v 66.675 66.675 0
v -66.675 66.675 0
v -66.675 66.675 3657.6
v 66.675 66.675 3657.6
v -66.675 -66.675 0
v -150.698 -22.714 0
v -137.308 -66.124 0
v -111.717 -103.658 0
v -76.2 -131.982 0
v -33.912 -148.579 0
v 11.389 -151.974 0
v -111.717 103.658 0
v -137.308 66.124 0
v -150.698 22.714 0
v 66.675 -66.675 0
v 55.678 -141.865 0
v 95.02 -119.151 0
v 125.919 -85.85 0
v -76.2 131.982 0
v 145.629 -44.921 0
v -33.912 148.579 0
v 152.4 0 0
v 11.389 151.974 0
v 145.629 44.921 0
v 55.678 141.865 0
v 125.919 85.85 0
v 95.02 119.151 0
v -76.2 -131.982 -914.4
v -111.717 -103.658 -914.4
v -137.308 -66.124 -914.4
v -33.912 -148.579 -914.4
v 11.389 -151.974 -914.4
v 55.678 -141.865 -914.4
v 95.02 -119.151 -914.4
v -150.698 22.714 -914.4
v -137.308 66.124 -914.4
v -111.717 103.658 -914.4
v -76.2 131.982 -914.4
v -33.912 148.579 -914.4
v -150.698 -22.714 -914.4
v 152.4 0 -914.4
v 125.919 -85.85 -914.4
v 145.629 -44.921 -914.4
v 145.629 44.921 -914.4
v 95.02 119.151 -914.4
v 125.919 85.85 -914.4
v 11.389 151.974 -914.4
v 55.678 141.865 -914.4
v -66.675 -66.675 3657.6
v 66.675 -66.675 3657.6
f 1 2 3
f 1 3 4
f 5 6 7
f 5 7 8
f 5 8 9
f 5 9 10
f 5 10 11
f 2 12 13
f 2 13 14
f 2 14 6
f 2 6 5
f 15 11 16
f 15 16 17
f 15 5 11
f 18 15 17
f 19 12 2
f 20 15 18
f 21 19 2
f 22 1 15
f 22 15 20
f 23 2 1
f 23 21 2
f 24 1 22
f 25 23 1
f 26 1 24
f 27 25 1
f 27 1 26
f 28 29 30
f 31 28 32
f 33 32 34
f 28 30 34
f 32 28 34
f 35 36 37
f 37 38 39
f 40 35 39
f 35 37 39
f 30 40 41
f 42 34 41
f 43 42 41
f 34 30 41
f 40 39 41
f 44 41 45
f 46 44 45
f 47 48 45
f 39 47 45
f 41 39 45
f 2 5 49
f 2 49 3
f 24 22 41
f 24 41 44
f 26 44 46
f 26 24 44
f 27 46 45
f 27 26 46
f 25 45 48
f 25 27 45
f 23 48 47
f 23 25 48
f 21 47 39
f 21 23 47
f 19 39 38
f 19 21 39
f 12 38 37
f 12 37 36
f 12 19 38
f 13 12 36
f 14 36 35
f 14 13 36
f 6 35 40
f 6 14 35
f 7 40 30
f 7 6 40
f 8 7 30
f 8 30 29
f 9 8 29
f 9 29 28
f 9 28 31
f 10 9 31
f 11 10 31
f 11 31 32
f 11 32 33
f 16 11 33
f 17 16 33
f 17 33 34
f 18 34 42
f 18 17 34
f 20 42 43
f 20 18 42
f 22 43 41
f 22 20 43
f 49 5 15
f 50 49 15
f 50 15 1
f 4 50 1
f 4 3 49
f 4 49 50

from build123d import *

# Parameters (mm, degrees)
F0_R     = 152.4
F1_DEPTH = 914.4
F2_W     = 133.35
F2_H     = 133.35
F3_DEPTH = 3657.6


with BuildPart() as f1:
    # F0 (on Top) → F1 (new body)
    with BuildSketch(Plane.XY):
        Circle(F0_R)
    extrude(amount=-F1_DEPTH)

    # F2 (on face) → F3 (join)
    with BuildSketch(Plane.XY):
        Rectangle(F2_W, F2_H)
    extrude(amount=F3_DEPTH)


solid = f1.part
